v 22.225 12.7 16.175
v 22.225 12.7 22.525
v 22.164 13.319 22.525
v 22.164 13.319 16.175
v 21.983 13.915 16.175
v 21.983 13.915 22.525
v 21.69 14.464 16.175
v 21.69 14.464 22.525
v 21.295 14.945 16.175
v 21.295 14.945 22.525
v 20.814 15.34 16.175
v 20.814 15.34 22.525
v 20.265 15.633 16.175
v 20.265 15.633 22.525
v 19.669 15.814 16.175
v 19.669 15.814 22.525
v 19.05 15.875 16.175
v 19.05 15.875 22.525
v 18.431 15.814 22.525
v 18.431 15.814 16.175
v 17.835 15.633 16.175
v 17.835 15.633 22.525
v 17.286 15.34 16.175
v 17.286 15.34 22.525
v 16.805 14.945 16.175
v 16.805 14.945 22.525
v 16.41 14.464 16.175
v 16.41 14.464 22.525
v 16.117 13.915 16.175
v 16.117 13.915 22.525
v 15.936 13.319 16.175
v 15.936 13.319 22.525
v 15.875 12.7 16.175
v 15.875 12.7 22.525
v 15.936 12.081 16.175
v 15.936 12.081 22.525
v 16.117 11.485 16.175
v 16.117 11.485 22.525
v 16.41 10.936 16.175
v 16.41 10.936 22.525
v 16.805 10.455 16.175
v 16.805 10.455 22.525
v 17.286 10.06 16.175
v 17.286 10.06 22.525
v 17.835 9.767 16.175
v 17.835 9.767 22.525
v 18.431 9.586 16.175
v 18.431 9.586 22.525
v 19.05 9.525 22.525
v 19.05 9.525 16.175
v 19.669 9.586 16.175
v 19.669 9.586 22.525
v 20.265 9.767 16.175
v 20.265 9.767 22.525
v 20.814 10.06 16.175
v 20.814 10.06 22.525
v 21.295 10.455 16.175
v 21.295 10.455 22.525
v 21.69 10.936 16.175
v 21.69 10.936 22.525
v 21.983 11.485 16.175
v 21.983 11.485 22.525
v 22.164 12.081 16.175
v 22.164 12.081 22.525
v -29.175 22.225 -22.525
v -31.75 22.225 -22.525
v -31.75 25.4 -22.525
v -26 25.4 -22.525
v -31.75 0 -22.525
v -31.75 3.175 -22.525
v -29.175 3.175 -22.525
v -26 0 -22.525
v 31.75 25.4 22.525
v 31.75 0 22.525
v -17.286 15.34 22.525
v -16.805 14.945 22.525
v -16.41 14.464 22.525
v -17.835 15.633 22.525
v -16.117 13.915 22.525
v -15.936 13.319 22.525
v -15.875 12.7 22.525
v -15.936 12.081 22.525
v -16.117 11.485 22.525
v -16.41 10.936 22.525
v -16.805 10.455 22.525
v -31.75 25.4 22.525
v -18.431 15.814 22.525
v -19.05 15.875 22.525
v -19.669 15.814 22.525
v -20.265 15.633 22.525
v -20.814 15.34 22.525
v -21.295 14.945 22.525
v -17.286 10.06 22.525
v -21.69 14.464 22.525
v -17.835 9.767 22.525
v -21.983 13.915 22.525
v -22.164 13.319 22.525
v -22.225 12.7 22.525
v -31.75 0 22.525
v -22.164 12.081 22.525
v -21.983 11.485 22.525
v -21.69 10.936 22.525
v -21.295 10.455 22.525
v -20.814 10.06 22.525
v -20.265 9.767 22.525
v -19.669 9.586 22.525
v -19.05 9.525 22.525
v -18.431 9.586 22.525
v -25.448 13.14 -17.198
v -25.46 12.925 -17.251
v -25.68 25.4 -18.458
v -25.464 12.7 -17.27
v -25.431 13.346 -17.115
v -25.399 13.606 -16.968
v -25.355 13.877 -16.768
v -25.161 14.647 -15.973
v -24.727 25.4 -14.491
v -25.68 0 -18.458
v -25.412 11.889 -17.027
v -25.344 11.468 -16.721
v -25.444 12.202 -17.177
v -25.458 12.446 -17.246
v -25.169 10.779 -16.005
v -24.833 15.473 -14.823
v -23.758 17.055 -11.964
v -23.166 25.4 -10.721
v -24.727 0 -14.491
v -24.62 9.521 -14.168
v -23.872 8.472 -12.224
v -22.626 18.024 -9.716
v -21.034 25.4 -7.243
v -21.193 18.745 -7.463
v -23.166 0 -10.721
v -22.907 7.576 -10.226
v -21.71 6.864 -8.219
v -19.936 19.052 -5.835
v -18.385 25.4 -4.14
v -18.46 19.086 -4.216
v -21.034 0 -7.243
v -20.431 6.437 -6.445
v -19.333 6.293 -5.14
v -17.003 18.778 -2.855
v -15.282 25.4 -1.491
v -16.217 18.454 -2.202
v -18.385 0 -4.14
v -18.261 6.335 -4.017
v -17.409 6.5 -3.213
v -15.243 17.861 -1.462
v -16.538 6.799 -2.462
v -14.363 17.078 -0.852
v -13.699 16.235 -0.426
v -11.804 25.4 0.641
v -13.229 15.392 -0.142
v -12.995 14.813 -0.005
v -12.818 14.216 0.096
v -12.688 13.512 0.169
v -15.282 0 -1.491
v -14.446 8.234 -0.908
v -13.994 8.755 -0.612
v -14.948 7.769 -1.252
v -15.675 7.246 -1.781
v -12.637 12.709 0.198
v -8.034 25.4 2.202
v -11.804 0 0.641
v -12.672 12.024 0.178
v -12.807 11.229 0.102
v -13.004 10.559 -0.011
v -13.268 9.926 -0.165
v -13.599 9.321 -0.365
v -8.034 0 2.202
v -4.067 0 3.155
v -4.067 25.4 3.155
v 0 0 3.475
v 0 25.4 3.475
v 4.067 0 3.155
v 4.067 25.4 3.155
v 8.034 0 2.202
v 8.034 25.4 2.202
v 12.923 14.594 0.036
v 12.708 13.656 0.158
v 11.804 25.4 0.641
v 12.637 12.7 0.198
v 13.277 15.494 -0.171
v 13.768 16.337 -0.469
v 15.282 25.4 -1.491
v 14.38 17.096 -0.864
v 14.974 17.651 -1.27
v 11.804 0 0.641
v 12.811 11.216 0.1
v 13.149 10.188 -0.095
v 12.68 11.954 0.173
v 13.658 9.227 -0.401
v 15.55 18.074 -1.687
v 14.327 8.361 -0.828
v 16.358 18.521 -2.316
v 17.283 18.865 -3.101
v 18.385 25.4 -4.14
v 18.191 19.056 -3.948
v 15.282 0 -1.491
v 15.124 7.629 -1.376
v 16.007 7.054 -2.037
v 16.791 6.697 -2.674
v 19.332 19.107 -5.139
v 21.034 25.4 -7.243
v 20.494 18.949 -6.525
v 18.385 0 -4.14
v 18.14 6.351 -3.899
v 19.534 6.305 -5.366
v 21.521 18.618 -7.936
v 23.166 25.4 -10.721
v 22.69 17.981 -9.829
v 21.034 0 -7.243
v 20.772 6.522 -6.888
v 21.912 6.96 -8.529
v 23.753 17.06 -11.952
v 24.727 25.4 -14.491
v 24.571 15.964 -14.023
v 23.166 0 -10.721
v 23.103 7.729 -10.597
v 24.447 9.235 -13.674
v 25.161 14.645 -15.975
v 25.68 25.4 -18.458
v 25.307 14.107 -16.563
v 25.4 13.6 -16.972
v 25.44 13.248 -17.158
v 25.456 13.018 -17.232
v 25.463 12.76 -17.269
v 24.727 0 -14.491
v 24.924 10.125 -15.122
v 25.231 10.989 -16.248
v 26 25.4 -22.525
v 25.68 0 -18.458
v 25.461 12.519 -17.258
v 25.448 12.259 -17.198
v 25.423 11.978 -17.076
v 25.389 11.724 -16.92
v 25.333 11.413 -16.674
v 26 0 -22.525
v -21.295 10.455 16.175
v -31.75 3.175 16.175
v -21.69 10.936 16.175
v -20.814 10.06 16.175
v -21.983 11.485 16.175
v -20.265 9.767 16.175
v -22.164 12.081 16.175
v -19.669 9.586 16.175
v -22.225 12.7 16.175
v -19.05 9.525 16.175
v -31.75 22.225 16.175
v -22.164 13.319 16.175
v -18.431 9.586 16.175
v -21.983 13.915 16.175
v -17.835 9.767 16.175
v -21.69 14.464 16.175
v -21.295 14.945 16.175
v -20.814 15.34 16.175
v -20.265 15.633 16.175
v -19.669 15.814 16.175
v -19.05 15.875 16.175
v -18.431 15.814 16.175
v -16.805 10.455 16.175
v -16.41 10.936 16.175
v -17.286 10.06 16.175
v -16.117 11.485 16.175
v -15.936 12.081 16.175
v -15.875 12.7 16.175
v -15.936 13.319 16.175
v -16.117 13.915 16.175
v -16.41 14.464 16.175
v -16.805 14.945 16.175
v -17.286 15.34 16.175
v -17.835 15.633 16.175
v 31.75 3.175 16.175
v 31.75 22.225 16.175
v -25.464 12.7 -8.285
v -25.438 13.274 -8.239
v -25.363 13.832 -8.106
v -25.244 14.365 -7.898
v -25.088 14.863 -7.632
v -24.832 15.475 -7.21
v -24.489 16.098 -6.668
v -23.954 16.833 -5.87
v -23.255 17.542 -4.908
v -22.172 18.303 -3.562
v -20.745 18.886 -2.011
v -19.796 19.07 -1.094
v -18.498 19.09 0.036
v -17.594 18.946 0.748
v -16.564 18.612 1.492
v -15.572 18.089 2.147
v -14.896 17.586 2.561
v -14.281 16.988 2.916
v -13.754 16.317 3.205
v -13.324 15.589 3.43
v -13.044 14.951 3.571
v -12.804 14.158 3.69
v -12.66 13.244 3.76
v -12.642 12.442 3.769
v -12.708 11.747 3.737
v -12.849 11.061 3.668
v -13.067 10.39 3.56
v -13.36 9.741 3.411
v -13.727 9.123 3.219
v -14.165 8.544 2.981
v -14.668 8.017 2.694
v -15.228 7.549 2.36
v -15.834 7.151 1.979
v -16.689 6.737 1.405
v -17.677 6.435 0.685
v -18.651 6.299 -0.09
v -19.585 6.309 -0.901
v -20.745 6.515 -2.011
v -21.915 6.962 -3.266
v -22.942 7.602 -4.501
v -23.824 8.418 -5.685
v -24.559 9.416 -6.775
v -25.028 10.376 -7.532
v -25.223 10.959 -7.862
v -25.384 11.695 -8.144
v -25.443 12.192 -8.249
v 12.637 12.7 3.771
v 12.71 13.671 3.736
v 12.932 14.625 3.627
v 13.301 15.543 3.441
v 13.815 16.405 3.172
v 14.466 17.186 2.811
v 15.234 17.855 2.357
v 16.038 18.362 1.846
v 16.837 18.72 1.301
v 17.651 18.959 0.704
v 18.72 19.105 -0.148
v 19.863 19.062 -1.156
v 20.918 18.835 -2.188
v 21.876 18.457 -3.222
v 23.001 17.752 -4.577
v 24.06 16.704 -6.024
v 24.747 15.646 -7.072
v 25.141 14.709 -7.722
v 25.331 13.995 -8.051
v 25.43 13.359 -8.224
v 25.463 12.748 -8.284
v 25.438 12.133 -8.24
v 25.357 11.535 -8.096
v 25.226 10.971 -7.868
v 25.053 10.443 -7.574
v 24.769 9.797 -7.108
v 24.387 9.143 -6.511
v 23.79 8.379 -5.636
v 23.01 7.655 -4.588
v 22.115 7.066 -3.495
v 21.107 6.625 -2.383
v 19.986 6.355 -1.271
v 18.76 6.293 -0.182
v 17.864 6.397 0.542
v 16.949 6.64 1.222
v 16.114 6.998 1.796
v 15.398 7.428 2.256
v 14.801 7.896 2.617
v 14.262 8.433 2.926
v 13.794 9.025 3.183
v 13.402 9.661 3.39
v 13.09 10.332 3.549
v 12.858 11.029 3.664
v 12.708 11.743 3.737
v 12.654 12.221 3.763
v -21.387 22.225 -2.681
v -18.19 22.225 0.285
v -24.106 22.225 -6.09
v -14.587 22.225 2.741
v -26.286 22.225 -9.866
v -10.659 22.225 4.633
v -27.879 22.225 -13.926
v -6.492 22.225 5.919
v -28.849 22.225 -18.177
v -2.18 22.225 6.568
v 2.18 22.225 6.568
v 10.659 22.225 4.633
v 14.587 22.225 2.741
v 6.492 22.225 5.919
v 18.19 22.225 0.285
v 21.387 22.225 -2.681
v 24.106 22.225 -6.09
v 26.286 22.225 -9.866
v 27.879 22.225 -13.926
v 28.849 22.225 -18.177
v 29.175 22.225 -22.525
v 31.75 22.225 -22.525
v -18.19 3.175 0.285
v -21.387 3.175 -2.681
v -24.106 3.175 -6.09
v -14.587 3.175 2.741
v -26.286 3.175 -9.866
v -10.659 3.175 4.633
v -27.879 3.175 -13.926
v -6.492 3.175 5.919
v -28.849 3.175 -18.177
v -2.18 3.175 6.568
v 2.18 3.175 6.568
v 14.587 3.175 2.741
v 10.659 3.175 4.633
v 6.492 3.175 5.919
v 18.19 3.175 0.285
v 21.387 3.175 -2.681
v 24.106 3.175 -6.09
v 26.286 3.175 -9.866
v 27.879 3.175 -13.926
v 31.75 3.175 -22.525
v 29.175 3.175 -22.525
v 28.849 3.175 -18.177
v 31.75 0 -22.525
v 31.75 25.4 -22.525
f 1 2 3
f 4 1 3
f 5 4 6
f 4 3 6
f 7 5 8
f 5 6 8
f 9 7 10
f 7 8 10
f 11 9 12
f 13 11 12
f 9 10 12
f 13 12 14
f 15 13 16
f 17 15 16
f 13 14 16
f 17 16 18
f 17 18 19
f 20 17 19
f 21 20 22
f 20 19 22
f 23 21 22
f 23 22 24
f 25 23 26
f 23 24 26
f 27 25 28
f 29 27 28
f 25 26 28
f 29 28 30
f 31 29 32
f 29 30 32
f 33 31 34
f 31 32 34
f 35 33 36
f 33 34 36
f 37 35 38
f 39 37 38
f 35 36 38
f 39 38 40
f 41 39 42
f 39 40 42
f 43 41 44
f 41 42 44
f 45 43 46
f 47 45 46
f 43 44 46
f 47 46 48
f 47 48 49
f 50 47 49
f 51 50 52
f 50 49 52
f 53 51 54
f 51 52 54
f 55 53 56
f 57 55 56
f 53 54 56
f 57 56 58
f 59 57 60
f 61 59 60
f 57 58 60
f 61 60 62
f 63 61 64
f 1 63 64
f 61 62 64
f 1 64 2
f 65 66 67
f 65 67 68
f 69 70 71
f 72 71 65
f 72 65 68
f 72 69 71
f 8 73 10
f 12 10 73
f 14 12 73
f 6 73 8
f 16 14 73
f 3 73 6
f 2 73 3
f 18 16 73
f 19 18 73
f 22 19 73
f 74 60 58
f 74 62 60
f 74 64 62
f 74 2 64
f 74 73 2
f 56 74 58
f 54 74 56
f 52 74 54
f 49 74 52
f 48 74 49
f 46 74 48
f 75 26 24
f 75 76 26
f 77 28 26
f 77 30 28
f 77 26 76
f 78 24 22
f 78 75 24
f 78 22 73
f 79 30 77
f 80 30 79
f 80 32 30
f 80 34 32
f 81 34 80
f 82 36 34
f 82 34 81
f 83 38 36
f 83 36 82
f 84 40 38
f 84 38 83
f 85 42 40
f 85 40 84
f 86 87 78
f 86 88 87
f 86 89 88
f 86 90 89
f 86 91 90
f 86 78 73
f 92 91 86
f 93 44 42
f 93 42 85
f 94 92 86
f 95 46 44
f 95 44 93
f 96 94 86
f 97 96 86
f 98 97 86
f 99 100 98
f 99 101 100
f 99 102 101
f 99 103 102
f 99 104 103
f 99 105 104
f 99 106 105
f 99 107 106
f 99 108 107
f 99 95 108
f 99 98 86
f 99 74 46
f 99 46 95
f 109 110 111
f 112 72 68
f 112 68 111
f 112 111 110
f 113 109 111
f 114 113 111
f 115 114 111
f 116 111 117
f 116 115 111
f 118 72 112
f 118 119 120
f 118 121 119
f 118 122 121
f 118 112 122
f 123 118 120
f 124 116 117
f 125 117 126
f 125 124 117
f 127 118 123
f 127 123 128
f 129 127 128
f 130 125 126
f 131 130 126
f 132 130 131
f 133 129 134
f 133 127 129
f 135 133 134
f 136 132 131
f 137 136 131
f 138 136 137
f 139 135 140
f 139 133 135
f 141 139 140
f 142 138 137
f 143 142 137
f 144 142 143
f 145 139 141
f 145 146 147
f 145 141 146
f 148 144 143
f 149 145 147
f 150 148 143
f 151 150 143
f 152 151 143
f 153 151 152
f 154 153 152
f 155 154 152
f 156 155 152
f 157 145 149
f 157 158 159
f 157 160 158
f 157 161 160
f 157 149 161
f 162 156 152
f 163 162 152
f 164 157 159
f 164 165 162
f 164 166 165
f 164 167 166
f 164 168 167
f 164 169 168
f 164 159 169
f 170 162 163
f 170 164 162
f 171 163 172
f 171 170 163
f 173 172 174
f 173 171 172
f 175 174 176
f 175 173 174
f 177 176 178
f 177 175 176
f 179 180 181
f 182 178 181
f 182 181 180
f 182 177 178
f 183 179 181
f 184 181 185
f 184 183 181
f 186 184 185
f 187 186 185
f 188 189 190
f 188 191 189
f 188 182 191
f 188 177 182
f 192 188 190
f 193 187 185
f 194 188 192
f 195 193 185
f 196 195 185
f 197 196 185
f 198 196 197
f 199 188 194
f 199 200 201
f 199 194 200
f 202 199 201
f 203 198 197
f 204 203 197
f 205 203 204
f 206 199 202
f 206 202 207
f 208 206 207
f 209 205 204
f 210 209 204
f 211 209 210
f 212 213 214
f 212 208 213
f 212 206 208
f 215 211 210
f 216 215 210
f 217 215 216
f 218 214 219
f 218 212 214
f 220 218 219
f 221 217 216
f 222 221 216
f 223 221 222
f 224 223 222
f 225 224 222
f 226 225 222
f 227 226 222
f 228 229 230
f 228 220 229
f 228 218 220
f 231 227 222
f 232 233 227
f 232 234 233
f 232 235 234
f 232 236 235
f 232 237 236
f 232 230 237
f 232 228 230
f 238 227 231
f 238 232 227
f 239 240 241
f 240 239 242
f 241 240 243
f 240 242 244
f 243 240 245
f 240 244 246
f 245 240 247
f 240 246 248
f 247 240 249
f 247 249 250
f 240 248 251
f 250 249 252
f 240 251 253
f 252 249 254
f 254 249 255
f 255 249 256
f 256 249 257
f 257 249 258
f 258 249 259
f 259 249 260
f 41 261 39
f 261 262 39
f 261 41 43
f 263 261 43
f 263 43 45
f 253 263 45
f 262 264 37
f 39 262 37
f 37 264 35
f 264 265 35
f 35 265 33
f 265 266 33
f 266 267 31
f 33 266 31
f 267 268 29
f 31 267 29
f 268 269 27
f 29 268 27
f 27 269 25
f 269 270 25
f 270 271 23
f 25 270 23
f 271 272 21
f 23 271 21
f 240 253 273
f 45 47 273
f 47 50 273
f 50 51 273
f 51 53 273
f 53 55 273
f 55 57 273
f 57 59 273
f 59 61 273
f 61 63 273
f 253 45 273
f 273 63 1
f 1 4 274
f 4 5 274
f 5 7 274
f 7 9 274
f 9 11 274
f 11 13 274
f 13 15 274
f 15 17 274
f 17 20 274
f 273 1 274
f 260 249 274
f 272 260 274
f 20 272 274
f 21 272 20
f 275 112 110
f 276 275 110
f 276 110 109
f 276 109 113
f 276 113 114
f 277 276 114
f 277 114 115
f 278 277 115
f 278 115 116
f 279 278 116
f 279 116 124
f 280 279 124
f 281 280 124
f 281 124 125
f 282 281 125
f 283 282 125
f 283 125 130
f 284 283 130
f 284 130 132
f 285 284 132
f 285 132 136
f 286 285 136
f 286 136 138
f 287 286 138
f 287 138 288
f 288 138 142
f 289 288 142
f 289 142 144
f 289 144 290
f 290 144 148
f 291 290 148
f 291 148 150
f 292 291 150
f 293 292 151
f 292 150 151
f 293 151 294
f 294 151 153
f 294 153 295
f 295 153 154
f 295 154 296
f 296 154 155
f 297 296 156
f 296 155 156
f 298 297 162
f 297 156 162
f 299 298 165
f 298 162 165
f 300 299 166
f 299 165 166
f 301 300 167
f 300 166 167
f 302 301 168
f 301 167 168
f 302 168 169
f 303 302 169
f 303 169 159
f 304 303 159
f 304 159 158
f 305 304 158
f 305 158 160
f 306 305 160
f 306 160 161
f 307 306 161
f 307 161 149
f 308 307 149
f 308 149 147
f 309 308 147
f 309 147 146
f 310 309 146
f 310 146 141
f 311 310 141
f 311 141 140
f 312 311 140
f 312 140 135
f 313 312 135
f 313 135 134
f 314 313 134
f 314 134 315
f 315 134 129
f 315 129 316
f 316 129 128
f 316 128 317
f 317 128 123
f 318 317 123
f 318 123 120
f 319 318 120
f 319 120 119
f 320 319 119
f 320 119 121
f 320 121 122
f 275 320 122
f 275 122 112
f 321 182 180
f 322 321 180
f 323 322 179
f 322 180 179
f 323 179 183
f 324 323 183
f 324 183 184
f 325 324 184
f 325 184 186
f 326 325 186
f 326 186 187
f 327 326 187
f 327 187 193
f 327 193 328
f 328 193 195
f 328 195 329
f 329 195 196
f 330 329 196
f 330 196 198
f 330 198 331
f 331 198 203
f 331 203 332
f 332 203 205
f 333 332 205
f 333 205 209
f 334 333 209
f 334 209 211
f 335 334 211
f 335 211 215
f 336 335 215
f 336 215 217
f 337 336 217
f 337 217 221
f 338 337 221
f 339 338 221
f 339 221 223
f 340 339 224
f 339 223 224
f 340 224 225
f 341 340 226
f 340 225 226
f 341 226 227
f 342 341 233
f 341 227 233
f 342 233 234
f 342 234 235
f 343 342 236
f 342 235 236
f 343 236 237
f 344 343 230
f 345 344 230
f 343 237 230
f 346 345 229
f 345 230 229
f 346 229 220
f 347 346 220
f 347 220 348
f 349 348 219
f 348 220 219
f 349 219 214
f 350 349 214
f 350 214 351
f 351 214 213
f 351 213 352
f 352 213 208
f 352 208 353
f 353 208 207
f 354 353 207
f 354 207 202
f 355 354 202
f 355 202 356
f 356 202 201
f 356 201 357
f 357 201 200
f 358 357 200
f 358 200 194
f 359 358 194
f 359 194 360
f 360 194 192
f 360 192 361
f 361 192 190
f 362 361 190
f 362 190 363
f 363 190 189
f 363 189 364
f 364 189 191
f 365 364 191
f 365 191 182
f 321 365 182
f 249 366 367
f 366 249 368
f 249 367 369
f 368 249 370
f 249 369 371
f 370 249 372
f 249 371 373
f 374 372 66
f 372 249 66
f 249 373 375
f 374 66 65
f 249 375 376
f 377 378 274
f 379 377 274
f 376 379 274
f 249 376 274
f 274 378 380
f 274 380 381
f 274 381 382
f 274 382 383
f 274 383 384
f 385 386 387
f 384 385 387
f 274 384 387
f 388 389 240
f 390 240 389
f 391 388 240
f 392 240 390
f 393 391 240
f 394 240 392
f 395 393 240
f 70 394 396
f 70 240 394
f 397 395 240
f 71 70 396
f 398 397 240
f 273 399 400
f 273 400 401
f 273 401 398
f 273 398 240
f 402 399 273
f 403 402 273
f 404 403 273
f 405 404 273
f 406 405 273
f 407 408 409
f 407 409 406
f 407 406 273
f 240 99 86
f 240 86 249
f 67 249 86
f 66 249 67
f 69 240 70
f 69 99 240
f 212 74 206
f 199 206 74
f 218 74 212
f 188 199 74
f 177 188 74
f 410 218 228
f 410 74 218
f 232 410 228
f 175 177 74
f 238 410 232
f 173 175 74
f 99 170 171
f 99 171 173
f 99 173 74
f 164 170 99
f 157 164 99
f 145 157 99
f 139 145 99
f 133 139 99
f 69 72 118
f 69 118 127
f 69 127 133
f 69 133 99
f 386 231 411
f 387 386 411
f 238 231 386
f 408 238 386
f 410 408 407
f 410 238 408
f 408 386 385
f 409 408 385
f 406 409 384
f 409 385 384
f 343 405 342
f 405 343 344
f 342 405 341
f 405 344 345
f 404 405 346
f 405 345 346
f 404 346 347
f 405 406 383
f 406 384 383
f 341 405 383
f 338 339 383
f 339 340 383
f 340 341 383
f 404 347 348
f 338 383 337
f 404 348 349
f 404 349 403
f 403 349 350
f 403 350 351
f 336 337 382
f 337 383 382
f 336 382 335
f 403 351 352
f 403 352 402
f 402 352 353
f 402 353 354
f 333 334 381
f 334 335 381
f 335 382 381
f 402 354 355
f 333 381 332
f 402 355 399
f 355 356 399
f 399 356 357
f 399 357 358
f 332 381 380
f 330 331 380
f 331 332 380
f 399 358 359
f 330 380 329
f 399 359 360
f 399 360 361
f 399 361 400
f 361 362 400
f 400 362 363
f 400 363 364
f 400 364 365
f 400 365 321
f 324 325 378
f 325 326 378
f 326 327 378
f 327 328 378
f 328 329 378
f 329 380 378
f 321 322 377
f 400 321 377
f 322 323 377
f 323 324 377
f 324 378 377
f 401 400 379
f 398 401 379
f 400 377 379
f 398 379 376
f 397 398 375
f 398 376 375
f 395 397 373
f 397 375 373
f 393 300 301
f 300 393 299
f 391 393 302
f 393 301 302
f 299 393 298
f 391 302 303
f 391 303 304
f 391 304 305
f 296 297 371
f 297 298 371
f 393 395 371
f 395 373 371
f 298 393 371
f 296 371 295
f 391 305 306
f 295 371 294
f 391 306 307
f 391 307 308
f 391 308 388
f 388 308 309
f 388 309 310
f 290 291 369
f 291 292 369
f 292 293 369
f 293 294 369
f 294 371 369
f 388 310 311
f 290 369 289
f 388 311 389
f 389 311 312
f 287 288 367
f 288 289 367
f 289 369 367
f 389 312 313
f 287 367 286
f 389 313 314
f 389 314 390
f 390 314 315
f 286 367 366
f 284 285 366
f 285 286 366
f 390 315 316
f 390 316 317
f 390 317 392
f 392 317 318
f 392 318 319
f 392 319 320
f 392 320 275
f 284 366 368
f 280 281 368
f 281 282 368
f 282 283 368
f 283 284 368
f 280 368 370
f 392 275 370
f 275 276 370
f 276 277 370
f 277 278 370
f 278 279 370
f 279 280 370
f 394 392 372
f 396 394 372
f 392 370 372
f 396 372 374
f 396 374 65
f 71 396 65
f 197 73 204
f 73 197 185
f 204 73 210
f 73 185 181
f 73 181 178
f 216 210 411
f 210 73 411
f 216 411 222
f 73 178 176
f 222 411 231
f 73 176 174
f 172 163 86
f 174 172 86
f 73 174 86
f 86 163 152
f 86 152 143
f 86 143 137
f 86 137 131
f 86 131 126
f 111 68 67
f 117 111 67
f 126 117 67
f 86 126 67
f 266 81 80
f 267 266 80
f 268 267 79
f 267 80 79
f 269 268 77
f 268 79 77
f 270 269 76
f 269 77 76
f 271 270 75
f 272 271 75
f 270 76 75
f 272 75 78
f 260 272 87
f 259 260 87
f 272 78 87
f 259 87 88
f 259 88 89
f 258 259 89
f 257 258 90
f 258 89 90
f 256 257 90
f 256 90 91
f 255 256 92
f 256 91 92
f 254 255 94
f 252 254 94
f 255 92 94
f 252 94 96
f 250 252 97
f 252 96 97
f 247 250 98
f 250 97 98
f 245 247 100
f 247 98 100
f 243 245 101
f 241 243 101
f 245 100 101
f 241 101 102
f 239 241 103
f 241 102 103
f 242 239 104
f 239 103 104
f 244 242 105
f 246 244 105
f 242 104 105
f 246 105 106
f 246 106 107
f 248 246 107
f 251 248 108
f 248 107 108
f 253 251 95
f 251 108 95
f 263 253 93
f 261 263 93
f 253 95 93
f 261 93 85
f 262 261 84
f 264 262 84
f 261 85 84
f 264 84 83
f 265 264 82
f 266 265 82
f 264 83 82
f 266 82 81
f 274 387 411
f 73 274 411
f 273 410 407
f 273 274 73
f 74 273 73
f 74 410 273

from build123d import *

# Parameters (mm, degrees)
BOSS_EXTRUDE1_DEPTH = 25.4
CUT_EXTRUDE3_START  = -3.175
CUT_EXTRUDE3_DEPTH  = 19.05
SKETCH5_R           = 3.175
CUT_EXTRUDE4_DEPTH  = 6.35
CUT_EXTRUDE5_REACH  = 62.685
SKETCH6_R           = 6.4135


with BuildPart() as part:
    # Sketch1 → Boss-Extrude1 (new body)
    with BuildSketch(Plane(origin=(0, 0, 0), x_dir=(1, 0, 0), z_dir=(0, 1, 0))):
        with BuildLine():
            Line((26, 22.525), (31.75, 22.525))
            Line((31.75, 22.525), (31.75, -22.525))
            Line((31.75, -22.525), (-31.75, -22.525))
            Line((-31.75, -22.525), (-31.75, 22.525))
            Line((-31.75, 22.525), (-26, 22.525))
            ThreePointArc((-26, 22.525), (0, -3.475), (26, 22.525))
        make_face()
    extrude(amount=BOSS_EXTRUDE1_DEPTH)

    # Sketch3 → Cut-Extrude3 (cut)
    with BuildSketch(Plane(origin=(0, 25.4, 0), x_dir=(1, 0, 0), z_dir=(0, 1, 0)).offset(CUT_EXTRUDE3_START)):
        with BuildLine():
            Line((-31.75, -16.175), (31.75, -16.175))
            Line((31.75, -16.175), (31.75, 22.525))
            Line((31.75, 22.525), (29.175, 22.525))
            ThreePointArc((29.175, 22.525), (0, -6.65), (-29.175, 22.525))
            Line((-29.175, 22.525), (-31.75, 22.525))
            Line((-31.75, 22.525), (-31.75, -16.175))
        make_face()
    extrude(amount=-CUT_EXTRUDE3_DEPTH, mode=Mode.SUBTRACT)

    # Sketch5 → Cut-Extrude4 (cut)
    with BuildSketch(Plane.XY.offset(22.525)):
        with Locations((-19.05, 12.7)):
            Circle(SKETCH5_R)
        with Locations((19.05, 12.7)):
            Circle(SKETCH5_R)
    extrude(amount=-CUT_EXTRUDE4_DEPTH, mode=Mode.SUBTRACT)

    # Cut-Extrude5: up to this face of the body (flat: up to its plane)
    cut_extrude5_end = Plane(part.part.faces().sort_by_distance((0, 12.7, 16.175))[0])
    # Sketch6 → Cut-Extrude5 (cut, up to the picked face)
    with BuildSketch(Plane(origin=(0, 0, -22.525), x_dir=(-1, 0, 0), z_dir=(0, 0, -1)), mode=Mode.PRIVATE) as cut_extrude5_sk1:
        with Locations((-19.05, 12.7)):
            Circle(SKETCH6_R)
    cut_extrude5_tool1 = split(extrude(cut_extrude5_sk1.sketch, amount=-CUT_EXTRUDE5_REACH, mode=Mode.PRIVATE), bisect_by=cut_extrude5_end, keep=Keep.BOTH, mode=Mode.PRIVATE)
    # Sketch6 → Cut-Extrude5 (cut, up to the picked face)
    with BuildSketch(Plane(origin=(0, 0, -22.525), x_dir=(-1, 0, 0), z_dir=(0, 0, -1)), mode=Mode.PRIVATE) as cut_extrude5_sk2:
        with Locations((19.05, 12.7)):
            Circle(SKETCH6_R)
    cut_extrude5_tool2 = split(extrude(cut_extrude5_sk2.sketch, amount=-CUT_EXTRUDE5_REACH, mode=Mode.PRIVATE), bisect_by=cut_extrude5_end, keep=Keep.BOTH, mode=Mode.PRIVATE)
    add(cut_extrude5_tool1.solids().sort_by(Axis((19.05, 12.7, -22.525), (0, 0, 1)))[0], mode=Mode.SUBTRACT)
    add(cut_extrude5_tool2.solids().sort_by(Axis((-19.05, 12.7, -22.525), (0, 0, 1)))[0], mode=Mode.SUBTRACT)


solid = part.part
